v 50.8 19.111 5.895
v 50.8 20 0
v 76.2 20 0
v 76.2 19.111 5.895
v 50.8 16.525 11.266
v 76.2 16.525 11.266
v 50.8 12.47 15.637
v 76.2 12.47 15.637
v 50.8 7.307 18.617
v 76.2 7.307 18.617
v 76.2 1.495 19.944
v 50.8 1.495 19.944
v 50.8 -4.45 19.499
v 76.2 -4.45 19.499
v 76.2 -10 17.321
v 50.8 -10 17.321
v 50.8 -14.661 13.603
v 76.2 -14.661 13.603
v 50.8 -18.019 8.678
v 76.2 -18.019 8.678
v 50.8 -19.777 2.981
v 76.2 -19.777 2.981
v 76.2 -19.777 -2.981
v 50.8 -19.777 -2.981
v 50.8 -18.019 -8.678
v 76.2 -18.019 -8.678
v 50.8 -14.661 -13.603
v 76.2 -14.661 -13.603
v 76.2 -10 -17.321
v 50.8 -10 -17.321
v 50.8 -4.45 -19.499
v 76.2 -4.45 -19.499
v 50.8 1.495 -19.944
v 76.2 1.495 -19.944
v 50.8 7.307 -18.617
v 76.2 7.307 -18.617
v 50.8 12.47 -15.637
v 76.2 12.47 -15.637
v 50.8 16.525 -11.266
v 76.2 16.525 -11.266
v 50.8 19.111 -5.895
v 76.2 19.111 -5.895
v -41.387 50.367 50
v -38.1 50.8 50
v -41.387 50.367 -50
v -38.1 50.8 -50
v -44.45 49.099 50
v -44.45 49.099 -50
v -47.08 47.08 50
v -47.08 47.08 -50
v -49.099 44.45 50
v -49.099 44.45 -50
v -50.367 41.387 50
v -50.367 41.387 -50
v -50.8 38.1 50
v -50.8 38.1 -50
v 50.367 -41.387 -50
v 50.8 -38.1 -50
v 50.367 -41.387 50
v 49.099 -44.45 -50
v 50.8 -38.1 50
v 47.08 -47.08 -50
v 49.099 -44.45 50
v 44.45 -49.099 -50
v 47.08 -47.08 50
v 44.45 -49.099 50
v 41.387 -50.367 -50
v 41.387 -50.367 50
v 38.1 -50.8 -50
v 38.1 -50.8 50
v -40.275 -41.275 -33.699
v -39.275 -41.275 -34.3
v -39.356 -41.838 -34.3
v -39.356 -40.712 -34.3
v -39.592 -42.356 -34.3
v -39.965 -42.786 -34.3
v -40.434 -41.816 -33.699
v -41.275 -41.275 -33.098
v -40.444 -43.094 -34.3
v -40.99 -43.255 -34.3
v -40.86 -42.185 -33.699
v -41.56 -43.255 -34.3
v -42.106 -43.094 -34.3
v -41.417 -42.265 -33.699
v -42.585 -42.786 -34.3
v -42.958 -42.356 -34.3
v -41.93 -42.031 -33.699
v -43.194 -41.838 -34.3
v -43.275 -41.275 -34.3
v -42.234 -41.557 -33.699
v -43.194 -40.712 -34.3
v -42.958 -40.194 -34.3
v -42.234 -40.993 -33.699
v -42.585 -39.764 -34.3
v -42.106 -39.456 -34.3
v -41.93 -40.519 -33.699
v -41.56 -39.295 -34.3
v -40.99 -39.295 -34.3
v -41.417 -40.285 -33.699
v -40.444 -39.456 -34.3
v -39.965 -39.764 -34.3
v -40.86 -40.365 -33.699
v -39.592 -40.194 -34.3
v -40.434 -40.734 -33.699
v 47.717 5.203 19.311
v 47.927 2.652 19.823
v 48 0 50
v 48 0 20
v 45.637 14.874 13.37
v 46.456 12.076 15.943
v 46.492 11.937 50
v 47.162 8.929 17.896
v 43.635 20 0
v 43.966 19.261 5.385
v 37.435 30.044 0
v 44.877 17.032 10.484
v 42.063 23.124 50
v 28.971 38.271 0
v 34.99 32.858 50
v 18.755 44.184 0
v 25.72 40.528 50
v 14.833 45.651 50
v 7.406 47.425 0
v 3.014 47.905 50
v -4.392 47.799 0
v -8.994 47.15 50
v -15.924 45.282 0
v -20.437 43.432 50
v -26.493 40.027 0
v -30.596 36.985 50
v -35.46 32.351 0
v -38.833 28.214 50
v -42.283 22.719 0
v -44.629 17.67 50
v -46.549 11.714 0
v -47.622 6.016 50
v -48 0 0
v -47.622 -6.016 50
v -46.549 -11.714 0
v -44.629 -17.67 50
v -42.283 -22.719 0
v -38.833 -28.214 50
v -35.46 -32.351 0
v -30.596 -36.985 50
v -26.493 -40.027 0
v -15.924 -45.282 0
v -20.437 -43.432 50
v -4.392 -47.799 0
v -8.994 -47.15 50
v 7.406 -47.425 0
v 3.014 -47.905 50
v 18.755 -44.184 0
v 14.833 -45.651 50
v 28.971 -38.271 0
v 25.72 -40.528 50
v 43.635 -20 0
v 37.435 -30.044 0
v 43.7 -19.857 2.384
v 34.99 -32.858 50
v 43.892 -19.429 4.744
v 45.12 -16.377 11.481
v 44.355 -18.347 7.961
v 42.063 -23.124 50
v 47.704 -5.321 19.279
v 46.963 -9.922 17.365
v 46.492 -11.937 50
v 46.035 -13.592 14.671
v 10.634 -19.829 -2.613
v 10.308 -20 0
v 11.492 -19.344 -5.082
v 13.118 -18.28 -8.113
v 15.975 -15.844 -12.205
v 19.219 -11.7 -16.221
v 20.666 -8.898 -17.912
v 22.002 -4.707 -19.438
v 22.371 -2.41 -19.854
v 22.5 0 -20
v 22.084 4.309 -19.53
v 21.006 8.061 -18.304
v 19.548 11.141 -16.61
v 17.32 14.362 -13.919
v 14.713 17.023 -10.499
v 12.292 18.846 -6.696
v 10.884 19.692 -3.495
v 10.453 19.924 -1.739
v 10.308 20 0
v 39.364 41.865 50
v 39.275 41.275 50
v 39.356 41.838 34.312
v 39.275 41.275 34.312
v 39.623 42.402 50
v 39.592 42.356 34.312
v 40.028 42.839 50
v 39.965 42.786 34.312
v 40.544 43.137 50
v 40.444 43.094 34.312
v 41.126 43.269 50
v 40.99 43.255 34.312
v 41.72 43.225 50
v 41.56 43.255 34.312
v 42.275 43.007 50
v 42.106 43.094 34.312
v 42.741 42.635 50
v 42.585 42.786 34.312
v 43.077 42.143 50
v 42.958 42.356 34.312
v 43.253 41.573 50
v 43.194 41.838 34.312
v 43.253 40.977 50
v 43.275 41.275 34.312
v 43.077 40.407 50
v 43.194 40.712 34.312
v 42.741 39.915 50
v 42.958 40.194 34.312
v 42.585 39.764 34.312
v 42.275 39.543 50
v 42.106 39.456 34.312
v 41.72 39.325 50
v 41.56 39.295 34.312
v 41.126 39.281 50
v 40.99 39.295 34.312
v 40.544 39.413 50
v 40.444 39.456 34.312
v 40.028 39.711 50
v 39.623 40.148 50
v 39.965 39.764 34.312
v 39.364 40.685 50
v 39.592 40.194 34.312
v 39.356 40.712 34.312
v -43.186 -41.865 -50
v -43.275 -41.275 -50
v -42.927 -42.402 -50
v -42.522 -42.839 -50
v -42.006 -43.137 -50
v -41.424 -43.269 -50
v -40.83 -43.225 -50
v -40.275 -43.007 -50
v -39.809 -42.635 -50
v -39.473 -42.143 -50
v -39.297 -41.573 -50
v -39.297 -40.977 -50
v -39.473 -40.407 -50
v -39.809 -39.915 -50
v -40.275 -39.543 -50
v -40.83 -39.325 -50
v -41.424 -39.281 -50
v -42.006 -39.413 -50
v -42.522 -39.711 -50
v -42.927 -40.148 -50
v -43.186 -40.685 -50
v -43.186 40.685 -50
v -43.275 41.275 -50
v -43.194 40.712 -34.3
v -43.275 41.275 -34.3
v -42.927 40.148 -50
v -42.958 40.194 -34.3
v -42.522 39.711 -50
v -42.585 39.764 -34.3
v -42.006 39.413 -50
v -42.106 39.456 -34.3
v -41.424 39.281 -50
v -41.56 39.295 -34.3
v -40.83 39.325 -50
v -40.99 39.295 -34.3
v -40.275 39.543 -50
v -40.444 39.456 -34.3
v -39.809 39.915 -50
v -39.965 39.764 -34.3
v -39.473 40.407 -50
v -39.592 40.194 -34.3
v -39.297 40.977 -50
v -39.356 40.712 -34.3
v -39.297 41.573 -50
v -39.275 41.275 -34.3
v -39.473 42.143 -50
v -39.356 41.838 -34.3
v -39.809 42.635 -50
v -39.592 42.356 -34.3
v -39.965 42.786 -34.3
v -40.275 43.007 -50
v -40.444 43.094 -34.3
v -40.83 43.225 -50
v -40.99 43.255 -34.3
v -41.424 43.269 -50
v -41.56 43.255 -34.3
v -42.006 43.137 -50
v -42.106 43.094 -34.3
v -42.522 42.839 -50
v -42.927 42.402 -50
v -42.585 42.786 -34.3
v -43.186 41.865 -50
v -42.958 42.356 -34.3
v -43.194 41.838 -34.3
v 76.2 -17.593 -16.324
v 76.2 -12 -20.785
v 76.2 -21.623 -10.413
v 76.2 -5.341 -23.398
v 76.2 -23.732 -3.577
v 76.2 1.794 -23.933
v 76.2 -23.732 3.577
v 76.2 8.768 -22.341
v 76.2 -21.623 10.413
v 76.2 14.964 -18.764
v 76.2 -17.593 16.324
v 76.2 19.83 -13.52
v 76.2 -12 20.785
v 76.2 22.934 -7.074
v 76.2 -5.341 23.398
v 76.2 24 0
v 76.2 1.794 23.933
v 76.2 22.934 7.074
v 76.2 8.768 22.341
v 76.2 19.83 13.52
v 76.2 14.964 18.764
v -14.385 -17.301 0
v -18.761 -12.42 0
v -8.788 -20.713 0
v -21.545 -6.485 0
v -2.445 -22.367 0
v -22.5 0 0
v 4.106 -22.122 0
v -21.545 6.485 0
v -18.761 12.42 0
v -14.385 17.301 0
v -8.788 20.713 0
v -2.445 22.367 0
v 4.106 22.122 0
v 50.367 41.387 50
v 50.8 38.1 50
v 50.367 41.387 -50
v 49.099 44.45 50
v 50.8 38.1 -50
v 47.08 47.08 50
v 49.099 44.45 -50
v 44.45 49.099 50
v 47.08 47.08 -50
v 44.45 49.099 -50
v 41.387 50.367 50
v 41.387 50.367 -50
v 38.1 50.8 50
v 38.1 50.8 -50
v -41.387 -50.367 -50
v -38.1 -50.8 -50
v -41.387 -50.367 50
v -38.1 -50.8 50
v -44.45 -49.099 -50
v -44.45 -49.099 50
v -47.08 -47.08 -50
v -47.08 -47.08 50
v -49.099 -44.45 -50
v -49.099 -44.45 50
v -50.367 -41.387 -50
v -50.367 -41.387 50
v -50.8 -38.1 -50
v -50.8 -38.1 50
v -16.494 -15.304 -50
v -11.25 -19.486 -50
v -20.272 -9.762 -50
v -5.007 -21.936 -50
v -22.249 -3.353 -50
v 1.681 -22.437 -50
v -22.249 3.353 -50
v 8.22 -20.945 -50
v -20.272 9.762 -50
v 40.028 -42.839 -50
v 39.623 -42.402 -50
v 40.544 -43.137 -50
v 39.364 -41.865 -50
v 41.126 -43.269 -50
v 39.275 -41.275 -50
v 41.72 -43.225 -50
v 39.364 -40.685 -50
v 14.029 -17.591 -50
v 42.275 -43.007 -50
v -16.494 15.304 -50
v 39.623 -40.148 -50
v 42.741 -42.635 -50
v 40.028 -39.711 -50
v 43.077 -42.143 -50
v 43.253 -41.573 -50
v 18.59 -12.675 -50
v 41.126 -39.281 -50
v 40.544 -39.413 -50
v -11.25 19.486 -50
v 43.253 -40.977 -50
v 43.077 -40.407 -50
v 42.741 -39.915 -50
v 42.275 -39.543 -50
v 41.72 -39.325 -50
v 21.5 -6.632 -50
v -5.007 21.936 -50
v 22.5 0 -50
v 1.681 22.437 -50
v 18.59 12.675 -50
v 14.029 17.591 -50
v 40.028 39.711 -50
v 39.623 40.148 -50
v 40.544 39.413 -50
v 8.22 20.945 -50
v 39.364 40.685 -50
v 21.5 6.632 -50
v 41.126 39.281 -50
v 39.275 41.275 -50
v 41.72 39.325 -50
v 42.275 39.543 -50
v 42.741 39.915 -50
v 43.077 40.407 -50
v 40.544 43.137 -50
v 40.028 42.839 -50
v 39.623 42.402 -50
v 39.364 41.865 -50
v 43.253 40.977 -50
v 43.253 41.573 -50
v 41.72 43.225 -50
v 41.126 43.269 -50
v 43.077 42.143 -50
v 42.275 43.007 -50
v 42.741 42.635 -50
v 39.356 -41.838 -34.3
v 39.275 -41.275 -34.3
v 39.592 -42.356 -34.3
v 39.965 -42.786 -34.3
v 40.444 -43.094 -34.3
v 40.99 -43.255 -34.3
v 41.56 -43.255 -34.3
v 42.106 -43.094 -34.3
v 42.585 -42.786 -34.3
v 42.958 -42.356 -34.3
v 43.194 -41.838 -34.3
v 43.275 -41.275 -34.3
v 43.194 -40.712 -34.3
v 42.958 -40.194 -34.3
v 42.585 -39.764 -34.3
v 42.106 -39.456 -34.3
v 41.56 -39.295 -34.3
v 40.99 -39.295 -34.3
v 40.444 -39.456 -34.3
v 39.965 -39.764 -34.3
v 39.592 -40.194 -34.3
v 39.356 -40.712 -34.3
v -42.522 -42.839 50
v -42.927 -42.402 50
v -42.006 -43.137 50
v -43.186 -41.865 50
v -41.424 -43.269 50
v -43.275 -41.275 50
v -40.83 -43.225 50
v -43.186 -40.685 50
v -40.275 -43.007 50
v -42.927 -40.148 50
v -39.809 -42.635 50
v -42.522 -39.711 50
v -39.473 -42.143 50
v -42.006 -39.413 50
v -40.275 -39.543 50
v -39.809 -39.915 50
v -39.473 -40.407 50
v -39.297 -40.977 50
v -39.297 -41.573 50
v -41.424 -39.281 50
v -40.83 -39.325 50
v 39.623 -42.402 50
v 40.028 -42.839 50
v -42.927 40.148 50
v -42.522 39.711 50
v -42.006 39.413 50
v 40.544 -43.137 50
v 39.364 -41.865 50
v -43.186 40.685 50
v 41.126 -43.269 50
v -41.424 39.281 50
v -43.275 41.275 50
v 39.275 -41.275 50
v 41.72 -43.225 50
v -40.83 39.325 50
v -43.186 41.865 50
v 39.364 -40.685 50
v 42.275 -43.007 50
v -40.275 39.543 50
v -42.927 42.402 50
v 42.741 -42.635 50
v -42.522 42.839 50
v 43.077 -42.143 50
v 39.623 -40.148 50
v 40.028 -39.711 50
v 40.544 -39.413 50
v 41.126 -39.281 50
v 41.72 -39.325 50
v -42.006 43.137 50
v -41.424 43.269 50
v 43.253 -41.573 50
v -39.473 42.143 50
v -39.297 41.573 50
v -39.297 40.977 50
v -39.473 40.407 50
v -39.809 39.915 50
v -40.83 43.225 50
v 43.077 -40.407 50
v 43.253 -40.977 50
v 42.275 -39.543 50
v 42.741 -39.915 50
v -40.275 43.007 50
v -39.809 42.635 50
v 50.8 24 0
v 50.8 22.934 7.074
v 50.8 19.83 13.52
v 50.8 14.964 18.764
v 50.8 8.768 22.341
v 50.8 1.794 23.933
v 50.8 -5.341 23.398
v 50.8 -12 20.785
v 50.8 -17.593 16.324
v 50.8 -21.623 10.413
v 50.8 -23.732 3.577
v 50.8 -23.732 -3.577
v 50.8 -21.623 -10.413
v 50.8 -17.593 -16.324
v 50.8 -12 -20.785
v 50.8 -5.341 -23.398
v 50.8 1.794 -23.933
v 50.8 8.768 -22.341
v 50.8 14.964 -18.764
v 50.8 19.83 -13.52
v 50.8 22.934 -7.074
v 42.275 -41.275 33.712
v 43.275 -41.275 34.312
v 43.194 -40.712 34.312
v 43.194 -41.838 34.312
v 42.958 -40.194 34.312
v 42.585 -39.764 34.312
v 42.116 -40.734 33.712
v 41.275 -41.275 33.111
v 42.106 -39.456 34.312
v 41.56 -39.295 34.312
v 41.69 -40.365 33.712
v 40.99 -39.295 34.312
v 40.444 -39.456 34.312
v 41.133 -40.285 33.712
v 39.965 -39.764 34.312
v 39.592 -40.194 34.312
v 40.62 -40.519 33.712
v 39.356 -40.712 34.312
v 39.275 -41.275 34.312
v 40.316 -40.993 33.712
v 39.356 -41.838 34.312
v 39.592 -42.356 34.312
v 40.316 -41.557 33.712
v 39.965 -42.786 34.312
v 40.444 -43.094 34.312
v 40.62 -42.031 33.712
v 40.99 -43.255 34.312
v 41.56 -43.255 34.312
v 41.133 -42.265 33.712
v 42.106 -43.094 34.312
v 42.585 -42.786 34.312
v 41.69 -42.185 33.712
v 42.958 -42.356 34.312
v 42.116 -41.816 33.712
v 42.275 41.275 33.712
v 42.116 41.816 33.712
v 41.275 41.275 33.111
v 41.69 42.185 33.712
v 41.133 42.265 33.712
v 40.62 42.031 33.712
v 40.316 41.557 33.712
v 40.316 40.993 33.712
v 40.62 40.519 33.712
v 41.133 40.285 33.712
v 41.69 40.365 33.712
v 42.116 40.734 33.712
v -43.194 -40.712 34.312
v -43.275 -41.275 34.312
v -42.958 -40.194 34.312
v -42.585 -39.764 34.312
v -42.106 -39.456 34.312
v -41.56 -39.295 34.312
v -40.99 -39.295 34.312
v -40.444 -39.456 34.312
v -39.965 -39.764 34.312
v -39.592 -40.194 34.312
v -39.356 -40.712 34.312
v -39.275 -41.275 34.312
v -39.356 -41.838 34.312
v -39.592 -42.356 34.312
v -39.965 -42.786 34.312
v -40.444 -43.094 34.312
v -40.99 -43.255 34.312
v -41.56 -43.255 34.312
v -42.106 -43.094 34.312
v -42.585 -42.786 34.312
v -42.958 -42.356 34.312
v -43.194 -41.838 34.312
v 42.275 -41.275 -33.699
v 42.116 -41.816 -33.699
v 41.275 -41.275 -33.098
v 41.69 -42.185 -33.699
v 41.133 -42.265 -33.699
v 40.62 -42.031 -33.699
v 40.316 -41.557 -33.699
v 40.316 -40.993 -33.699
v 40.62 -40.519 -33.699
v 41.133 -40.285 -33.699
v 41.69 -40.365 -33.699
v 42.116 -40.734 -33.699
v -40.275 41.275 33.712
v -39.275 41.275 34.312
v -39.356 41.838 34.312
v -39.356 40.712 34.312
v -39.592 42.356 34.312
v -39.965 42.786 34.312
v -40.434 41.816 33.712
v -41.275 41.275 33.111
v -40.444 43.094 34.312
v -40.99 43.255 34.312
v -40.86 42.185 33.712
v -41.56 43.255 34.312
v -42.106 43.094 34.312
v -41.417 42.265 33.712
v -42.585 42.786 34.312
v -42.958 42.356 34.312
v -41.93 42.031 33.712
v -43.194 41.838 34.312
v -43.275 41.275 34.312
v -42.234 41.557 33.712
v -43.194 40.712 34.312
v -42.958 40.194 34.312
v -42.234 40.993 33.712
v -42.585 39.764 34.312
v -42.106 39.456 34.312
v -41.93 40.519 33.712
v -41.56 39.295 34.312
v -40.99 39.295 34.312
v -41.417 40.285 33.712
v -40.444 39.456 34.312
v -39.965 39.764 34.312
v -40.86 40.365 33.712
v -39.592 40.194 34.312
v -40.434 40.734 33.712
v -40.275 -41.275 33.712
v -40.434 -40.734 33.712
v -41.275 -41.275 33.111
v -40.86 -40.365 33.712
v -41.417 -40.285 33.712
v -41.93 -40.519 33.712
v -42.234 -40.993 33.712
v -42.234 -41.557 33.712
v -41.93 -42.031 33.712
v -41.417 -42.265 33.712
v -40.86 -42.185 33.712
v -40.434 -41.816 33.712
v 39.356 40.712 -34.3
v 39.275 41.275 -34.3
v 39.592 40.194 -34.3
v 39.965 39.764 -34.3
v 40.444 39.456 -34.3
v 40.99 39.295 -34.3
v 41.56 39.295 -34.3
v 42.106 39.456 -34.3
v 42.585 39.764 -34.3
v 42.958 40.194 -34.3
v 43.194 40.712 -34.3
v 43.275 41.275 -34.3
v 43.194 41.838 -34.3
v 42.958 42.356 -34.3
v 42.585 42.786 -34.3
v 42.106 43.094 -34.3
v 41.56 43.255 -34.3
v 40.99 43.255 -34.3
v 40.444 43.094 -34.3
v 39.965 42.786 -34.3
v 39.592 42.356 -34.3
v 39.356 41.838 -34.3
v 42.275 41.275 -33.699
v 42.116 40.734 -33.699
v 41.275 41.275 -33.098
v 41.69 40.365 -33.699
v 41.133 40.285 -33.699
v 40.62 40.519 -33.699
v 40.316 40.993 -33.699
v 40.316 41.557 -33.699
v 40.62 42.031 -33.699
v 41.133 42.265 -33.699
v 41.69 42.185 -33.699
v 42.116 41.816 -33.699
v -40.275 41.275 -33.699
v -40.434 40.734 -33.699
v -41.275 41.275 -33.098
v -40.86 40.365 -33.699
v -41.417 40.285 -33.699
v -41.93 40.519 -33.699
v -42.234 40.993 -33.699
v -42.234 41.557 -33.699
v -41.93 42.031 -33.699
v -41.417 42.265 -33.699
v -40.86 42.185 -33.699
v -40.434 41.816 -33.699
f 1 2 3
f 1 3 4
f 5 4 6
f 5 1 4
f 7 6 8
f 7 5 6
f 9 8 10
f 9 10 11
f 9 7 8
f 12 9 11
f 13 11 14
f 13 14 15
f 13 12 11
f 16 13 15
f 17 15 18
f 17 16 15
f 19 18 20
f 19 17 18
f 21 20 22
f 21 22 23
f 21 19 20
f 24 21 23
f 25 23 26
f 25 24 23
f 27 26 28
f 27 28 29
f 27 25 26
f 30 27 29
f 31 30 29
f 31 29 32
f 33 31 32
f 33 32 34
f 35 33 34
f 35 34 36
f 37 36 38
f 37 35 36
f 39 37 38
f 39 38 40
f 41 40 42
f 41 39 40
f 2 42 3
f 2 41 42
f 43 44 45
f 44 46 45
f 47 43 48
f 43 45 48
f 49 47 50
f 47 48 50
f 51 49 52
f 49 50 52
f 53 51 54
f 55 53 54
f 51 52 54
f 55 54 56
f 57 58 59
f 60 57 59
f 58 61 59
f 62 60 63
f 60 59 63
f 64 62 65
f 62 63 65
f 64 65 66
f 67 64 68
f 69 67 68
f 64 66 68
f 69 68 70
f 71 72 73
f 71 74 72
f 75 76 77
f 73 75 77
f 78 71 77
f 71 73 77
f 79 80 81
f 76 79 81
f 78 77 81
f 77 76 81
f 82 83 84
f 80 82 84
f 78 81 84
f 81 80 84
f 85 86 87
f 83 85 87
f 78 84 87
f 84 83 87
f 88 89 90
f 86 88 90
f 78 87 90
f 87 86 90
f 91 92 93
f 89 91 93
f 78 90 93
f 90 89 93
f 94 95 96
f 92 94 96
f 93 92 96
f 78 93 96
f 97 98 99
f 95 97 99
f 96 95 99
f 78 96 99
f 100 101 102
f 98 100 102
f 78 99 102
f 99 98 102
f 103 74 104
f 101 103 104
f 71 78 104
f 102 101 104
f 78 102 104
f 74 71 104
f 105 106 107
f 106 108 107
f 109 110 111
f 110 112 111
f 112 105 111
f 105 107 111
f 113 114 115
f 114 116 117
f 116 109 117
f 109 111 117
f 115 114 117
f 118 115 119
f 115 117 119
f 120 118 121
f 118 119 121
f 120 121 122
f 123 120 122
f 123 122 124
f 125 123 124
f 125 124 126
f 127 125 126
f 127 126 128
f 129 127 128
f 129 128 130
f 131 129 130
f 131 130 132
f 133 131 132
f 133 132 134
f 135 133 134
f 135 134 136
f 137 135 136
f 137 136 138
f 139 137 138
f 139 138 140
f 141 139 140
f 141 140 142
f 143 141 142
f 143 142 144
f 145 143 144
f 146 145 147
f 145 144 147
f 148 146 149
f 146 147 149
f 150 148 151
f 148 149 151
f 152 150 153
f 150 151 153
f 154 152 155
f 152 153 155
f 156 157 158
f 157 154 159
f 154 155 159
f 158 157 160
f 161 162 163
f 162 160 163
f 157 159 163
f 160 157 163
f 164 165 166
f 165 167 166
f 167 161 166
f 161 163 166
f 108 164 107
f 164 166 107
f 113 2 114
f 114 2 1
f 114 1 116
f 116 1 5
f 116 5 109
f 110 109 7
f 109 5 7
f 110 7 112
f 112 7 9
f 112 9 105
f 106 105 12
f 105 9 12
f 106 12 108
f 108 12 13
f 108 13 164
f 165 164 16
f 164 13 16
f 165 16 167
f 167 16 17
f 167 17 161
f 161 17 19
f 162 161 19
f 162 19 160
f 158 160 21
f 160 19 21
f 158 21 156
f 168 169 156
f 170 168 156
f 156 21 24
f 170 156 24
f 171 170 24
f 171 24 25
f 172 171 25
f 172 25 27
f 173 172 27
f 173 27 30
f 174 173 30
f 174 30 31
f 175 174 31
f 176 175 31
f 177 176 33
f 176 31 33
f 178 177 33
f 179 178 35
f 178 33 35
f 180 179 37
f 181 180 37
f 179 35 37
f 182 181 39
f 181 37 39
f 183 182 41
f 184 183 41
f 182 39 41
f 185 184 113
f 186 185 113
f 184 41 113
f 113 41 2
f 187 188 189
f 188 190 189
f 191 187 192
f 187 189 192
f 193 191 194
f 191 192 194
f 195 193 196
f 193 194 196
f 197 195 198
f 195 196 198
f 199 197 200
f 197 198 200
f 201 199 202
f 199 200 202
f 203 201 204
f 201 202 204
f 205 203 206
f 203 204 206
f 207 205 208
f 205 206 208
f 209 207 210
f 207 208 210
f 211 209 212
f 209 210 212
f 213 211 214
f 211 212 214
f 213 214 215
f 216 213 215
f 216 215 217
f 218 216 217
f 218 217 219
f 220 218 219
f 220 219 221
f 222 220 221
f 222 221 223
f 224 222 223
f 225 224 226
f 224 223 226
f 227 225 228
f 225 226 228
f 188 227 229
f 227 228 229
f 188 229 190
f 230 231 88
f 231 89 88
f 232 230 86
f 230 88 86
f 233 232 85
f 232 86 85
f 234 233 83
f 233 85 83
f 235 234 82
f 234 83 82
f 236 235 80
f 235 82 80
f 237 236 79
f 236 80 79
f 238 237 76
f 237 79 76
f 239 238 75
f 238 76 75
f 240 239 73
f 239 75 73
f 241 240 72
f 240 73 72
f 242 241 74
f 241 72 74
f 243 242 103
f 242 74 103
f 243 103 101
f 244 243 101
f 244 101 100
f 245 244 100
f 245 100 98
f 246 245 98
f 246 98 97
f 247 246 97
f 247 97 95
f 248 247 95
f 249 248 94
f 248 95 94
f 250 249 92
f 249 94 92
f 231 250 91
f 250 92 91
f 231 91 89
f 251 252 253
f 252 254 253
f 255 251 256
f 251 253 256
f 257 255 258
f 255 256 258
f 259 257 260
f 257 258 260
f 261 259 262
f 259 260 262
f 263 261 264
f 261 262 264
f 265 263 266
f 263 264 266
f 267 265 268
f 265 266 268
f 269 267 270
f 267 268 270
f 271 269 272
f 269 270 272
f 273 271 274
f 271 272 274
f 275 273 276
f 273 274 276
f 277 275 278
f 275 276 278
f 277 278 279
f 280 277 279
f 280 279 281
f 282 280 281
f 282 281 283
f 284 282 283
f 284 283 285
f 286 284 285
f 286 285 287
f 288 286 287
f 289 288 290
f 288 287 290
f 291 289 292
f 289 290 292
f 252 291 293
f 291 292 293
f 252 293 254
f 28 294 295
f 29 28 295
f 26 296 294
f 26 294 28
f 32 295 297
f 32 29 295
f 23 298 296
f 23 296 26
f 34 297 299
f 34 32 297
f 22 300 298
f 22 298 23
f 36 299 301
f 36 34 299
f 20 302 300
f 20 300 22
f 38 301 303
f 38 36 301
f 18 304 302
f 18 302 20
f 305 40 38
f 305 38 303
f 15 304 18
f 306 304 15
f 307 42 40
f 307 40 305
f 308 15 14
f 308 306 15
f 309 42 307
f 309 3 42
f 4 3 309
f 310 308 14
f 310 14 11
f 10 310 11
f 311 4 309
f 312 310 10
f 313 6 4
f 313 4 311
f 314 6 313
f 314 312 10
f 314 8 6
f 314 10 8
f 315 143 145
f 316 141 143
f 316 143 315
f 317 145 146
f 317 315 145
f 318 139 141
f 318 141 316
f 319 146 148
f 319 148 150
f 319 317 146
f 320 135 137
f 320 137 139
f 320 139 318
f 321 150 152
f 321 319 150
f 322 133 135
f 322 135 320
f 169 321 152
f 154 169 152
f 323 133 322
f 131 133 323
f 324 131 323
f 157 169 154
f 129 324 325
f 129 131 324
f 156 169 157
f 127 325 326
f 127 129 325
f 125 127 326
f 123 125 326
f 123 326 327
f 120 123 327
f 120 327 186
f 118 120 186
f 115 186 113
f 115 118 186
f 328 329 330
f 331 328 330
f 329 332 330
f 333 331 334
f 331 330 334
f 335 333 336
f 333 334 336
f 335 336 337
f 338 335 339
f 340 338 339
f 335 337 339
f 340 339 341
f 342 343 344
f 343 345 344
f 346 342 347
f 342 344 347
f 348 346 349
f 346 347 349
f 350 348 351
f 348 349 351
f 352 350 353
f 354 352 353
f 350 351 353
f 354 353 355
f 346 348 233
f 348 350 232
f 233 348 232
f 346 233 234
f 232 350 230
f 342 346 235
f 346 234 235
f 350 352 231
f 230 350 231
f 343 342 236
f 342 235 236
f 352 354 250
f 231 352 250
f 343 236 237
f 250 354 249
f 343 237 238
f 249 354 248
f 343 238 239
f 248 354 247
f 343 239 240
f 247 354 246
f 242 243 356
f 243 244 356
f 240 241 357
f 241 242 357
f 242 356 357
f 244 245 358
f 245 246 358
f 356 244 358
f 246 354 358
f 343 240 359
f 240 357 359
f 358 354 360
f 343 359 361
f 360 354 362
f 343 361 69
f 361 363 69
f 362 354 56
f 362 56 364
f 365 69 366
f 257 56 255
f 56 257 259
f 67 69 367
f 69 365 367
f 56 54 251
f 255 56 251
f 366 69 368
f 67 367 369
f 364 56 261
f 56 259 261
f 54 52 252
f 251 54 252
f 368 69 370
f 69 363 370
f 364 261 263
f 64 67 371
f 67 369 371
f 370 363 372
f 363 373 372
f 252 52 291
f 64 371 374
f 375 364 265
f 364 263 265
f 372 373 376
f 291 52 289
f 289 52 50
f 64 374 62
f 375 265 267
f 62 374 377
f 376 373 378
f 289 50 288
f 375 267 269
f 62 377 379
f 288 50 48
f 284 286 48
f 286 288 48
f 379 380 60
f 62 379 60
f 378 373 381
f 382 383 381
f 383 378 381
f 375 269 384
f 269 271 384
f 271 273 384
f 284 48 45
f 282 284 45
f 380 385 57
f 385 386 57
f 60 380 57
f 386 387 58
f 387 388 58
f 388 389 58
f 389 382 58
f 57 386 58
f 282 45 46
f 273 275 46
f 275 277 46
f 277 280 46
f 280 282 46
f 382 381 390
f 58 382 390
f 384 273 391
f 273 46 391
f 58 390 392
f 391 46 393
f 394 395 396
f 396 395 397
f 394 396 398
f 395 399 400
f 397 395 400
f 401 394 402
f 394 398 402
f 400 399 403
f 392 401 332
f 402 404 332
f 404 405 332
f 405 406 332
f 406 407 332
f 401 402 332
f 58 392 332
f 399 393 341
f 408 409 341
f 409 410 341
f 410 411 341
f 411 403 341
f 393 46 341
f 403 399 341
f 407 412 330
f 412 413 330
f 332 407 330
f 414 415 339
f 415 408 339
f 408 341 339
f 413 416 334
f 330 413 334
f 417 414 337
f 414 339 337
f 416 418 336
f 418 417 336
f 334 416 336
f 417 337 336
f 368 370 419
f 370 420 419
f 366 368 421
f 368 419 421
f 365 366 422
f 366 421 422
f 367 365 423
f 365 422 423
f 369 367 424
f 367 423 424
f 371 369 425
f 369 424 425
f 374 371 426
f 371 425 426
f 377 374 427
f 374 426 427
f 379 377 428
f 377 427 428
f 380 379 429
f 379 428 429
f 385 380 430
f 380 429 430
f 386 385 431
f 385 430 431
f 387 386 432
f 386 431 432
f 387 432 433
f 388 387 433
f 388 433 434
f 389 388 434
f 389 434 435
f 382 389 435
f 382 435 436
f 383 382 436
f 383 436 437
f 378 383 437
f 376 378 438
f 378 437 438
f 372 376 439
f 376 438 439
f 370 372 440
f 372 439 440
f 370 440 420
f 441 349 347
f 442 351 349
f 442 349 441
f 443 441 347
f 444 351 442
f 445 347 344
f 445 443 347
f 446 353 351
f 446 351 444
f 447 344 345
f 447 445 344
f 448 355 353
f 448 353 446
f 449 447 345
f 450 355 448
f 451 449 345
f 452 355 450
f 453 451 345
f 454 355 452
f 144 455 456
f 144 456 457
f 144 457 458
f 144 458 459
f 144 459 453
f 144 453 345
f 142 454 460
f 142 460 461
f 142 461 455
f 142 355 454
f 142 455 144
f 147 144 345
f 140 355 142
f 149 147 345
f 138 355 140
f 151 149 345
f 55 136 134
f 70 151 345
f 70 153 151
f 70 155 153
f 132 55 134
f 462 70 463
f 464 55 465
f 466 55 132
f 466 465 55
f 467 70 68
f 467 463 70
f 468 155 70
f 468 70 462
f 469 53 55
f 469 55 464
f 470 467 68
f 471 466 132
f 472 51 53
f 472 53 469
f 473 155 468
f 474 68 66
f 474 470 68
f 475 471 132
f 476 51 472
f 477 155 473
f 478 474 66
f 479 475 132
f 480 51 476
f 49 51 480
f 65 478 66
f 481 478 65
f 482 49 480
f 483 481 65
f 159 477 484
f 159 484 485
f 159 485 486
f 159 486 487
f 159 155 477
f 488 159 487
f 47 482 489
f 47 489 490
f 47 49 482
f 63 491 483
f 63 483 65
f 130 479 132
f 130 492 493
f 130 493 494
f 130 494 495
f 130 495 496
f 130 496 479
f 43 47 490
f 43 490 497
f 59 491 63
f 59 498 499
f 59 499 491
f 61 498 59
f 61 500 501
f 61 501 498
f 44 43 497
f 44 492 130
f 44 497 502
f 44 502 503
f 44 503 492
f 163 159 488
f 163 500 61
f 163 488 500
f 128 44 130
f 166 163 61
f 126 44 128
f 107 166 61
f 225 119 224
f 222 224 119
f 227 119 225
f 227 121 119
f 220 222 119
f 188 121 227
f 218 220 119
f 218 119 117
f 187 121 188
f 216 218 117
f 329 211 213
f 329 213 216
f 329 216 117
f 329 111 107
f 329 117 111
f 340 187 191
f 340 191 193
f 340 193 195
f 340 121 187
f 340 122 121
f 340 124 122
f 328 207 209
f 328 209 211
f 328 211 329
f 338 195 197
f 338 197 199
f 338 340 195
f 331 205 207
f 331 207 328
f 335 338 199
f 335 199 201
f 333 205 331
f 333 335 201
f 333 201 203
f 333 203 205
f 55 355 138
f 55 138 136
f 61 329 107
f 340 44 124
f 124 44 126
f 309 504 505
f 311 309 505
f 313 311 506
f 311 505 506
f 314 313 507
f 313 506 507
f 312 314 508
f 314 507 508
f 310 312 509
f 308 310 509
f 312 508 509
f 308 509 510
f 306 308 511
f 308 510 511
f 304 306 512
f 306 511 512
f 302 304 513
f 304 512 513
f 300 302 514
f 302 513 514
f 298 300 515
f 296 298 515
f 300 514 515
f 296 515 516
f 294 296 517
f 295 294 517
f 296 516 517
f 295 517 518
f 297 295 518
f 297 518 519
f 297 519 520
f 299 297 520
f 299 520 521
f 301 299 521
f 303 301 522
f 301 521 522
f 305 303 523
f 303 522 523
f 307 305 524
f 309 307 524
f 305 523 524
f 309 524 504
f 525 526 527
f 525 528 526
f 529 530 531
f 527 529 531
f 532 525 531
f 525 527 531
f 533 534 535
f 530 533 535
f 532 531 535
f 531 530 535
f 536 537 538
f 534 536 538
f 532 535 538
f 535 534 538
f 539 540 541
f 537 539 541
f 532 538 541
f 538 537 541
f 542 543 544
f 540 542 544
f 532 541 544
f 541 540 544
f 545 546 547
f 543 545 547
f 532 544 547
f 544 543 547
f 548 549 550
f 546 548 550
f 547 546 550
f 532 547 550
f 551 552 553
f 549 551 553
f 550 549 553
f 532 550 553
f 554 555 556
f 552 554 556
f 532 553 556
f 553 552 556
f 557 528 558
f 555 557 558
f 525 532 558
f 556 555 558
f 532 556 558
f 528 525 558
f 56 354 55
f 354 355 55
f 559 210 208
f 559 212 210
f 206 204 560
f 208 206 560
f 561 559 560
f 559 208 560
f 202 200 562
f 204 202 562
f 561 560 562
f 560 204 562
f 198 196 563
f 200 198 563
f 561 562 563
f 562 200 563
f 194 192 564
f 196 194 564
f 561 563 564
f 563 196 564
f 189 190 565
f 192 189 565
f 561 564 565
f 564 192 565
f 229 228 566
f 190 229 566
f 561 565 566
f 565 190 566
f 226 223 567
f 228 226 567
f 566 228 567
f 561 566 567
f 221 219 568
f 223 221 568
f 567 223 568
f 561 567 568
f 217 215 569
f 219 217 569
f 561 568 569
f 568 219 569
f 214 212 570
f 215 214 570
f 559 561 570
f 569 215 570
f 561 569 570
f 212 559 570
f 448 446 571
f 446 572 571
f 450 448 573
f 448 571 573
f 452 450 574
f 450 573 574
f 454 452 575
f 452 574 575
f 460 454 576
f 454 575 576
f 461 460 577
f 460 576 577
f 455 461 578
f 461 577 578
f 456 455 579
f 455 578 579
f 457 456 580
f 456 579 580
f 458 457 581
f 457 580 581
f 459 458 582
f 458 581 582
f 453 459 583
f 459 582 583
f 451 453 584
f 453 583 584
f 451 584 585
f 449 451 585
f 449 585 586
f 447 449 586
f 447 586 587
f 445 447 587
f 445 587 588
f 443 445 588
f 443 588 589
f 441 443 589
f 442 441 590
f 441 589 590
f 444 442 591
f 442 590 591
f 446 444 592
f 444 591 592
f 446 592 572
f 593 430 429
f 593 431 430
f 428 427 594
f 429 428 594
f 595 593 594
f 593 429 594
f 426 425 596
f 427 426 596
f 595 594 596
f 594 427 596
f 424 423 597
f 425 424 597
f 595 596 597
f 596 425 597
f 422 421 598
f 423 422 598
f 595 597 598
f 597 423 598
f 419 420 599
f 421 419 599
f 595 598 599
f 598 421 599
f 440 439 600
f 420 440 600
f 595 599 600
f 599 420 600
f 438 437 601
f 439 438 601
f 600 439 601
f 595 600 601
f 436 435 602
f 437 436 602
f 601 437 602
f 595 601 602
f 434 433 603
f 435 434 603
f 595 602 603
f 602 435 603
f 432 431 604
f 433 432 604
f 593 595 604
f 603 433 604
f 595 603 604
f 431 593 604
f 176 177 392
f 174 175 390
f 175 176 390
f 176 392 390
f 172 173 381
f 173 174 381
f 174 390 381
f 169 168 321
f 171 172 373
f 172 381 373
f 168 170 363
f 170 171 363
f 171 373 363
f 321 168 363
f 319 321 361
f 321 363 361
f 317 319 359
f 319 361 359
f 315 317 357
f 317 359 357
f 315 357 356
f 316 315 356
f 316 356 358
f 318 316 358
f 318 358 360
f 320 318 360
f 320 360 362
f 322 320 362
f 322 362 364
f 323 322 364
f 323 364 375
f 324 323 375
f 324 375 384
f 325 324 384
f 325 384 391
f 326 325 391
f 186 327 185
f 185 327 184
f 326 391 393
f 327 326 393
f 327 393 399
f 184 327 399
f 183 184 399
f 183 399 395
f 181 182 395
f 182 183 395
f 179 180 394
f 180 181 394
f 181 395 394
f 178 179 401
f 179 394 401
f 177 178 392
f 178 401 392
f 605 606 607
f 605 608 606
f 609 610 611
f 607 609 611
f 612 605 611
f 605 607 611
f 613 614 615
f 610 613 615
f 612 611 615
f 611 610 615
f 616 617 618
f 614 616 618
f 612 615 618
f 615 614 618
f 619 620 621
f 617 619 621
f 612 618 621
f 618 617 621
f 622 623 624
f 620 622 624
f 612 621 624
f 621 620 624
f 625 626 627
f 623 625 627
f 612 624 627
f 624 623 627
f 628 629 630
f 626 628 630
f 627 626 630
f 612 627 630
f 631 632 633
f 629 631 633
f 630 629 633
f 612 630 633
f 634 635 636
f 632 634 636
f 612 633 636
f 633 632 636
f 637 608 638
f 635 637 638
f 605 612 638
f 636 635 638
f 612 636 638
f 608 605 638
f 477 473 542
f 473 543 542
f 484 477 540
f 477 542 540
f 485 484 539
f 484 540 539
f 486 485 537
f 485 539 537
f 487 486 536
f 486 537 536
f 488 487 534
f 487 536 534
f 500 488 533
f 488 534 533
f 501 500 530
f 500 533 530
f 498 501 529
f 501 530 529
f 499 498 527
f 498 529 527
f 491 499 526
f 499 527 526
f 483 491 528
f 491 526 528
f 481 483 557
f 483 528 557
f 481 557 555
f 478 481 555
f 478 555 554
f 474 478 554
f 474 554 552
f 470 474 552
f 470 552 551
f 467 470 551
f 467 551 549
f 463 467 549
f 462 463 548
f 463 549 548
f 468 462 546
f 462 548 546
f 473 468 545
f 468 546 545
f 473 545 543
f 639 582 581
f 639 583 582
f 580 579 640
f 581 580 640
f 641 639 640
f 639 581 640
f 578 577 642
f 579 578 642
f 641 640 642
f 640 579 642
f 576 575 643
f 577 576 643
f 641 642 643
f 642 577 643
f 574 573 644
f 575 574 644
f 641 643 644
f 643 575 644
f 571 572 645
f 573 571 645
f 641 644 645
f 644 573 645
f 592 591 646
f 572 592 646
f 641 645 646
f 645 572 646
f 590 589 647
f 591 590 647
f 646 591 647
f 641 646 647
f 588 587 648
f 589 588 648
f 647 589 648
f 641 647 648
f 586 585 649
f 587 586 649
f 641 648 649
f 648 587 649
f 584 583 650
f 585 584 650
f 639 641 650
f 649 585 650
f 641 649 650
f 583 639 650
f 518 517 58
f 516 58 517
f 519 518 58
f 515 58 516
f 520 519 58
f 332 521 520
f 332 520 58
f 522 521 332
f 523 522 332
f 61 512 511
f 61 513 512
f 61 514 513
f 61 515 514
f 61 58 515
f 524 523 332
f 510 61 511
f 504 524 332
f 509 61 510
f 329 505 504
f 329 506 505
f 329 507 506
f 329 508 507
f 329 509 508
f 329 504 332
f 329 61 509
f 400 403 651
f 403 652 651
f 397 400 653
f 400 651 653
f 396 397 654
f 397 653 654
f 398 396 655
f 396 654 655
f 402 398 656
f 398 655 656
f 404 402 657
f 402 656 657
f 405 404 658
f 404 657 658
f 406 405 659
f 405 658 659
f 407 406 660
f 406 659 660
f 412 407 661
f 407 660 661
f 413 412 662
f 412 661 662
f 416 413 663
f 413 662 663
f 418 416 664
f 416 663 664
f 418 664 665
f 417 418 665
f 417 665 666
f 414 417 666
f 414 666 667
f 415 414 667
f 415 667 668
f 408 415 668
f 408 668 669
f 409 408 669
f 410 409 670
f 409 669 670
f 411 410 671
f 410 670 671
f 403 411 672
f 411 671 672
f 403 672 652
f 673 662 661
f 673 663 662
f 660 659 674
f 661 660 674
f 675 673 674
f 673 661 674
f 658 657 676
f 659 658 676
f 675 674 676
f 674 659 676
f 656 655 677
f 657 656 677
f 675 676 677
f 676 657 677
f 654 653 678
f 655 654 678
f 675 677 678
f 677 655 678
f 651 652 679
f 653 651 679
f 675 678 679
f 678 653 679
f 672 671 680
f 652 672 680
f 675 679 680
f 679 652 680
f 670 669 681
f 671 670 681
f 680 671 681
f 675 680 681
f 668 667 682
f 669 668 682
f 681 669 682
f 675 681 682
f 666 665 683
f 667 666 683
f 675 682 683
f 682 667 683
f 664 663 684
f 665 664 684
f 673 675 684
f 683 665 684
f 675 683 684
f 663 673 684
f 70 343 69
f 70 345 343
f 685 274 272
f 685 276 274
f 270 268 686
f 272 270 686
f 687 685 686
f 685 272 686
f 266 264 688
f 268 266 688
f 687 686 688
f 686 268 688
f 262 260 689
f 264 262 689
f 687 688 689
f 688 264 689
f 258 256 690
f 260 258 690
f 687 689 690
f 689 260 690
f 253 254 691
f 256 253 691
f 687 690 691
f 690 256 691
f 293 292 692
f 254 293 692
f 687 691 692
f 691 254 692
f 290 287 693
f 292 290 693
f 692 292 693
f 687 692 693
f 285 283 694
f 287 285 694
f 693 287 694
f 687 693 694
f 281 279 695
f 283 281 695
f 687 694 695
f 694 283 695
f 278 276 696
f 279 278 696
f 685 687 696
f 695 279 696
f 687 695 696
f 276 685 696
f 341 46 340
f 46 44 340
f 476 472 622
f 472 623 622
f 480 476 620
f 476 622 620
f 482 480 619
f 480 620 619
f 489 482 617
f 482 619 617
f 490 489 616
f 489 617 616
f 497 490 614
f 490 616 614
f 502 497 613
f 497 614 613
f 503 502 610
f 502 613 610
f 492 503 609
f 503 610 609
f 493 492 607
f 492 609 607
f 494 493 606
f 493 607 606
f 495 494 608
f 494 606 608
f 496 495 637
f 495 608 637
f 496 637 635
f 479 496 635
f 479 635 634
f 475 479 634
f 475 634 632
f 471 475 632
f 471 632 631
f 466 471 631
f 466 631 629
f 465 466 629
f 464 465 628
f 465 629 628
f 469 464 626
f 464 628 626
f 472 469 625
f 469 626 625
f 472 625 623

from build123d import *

# Parameters (mm, degrees)
F0_W      = 101.6
F0_H      = 101.6
F0_R      = 48
F1_DEPTH  = 50
F2_R      = 20
F3_DEPTH  = 50.8
F4_R      = 48
F5_DEPTH  = 50
F6_R      = 22.5
F7_DEPTH  = 100.0010001
F8_R      = 24
F8_R_2    = 20
F9_DEPTH  = 25.4
F10_R     = 12.7
F12_D     = 4
F12_DEPTH = 15.6876
F12_TIP   = 1.2017212381
F14_D     = 4
F14_DEPTH = 15.7
F14_TIP   = 1.2017212381


with BuildPart() as f1:
    # F0 (on Top) → F1 (new body, symmetric)
    with BuildSketch(Plane.XY):
        Rectangle(F0_W, F0_H)
        Circle(F0_R, mode=Mode.SUBTRACT)
        Circle(F0_R)
    extrude(amount=F1_DEPTH, both=True)

    # F2 (on face) → F3 (cut)
    with BuildSketch(Plane.YZ.offset(50.8)):
        Circle(F2_R)
    extrude(amount=-F3_DEPTH, mode=Mode.SUBTRACT)

    # F4 (on face) → F5 (cut)
    with BuildSketch(Plane.XY.offset(50)):
        Circle(F4_R)
    extrude(amount=-F5_DEPTH, mode=Mode.SUBTRACT)

    # F6 (on face) → F7 (cut, through all)
    with BuildSketch(Plane(origin=(0, 0, -50), x_dir=(1, 0, 0), z_dir=(0, 0, -1))):
        Circle(F6_R)
    extrude(amount=-F7_DEPTH, mode=Mode.SUBTRACT)

    # F8 (on face) → F9 (join)
    with BuildSketch(Plane.YZ.offset(50.8)):
        Circle(F8_R)
        Circle(F8_R_2, mode=Mode.SUBTRACT)
    extrude(amount=F9_DEPTH)

    # F10
    f10_edges = [f1.edges().sort_by_distance(p)[0] for p in [
        (50.8, -50.8, 0),
        (-50.8, -50.8, 0),
        (50.8, 50.8, 0),
        (-50.8, 50.8, 0),
    ]]
    fillet(f10_edges, radius=F10_R)

    # F12
    with Locations(Plane.XY.offset(50)):
        with Locations((-41.275, 41.275), (41.275, 41.275), (41.275, -41.275), (-41.275, -41.275)):
            Hole(F12_D / 2, depth=F12_DEPTH)
            with Locations((0, 0, -(F12_DEPTH + F12_TIP / 2))):  # 118° drill point
                Cone(0, F12_D / 2, F12_TIP, mode=Mode.SUBTRACT)

    # F14
    with Locations(Plane(origin=(0, 0, -50), x_dir=(1, 0, 0), z_dir=(0, 0, -1))):
        with Locations((-41.275, 41.275), (41.275, 41.275), (-41.275, -41.275), (41.275, -41.275)):
            Hole(F14_D / 2, depth=F14_DEPTH)
            with Locations((0, 0, -(F14_DEPTH + F14_TIP / 2))):  # 118° drill point
                Cone(0, F14_D / 2, F14_TIP, mode=Mode.SUBTRACT)


solid = f1.part
